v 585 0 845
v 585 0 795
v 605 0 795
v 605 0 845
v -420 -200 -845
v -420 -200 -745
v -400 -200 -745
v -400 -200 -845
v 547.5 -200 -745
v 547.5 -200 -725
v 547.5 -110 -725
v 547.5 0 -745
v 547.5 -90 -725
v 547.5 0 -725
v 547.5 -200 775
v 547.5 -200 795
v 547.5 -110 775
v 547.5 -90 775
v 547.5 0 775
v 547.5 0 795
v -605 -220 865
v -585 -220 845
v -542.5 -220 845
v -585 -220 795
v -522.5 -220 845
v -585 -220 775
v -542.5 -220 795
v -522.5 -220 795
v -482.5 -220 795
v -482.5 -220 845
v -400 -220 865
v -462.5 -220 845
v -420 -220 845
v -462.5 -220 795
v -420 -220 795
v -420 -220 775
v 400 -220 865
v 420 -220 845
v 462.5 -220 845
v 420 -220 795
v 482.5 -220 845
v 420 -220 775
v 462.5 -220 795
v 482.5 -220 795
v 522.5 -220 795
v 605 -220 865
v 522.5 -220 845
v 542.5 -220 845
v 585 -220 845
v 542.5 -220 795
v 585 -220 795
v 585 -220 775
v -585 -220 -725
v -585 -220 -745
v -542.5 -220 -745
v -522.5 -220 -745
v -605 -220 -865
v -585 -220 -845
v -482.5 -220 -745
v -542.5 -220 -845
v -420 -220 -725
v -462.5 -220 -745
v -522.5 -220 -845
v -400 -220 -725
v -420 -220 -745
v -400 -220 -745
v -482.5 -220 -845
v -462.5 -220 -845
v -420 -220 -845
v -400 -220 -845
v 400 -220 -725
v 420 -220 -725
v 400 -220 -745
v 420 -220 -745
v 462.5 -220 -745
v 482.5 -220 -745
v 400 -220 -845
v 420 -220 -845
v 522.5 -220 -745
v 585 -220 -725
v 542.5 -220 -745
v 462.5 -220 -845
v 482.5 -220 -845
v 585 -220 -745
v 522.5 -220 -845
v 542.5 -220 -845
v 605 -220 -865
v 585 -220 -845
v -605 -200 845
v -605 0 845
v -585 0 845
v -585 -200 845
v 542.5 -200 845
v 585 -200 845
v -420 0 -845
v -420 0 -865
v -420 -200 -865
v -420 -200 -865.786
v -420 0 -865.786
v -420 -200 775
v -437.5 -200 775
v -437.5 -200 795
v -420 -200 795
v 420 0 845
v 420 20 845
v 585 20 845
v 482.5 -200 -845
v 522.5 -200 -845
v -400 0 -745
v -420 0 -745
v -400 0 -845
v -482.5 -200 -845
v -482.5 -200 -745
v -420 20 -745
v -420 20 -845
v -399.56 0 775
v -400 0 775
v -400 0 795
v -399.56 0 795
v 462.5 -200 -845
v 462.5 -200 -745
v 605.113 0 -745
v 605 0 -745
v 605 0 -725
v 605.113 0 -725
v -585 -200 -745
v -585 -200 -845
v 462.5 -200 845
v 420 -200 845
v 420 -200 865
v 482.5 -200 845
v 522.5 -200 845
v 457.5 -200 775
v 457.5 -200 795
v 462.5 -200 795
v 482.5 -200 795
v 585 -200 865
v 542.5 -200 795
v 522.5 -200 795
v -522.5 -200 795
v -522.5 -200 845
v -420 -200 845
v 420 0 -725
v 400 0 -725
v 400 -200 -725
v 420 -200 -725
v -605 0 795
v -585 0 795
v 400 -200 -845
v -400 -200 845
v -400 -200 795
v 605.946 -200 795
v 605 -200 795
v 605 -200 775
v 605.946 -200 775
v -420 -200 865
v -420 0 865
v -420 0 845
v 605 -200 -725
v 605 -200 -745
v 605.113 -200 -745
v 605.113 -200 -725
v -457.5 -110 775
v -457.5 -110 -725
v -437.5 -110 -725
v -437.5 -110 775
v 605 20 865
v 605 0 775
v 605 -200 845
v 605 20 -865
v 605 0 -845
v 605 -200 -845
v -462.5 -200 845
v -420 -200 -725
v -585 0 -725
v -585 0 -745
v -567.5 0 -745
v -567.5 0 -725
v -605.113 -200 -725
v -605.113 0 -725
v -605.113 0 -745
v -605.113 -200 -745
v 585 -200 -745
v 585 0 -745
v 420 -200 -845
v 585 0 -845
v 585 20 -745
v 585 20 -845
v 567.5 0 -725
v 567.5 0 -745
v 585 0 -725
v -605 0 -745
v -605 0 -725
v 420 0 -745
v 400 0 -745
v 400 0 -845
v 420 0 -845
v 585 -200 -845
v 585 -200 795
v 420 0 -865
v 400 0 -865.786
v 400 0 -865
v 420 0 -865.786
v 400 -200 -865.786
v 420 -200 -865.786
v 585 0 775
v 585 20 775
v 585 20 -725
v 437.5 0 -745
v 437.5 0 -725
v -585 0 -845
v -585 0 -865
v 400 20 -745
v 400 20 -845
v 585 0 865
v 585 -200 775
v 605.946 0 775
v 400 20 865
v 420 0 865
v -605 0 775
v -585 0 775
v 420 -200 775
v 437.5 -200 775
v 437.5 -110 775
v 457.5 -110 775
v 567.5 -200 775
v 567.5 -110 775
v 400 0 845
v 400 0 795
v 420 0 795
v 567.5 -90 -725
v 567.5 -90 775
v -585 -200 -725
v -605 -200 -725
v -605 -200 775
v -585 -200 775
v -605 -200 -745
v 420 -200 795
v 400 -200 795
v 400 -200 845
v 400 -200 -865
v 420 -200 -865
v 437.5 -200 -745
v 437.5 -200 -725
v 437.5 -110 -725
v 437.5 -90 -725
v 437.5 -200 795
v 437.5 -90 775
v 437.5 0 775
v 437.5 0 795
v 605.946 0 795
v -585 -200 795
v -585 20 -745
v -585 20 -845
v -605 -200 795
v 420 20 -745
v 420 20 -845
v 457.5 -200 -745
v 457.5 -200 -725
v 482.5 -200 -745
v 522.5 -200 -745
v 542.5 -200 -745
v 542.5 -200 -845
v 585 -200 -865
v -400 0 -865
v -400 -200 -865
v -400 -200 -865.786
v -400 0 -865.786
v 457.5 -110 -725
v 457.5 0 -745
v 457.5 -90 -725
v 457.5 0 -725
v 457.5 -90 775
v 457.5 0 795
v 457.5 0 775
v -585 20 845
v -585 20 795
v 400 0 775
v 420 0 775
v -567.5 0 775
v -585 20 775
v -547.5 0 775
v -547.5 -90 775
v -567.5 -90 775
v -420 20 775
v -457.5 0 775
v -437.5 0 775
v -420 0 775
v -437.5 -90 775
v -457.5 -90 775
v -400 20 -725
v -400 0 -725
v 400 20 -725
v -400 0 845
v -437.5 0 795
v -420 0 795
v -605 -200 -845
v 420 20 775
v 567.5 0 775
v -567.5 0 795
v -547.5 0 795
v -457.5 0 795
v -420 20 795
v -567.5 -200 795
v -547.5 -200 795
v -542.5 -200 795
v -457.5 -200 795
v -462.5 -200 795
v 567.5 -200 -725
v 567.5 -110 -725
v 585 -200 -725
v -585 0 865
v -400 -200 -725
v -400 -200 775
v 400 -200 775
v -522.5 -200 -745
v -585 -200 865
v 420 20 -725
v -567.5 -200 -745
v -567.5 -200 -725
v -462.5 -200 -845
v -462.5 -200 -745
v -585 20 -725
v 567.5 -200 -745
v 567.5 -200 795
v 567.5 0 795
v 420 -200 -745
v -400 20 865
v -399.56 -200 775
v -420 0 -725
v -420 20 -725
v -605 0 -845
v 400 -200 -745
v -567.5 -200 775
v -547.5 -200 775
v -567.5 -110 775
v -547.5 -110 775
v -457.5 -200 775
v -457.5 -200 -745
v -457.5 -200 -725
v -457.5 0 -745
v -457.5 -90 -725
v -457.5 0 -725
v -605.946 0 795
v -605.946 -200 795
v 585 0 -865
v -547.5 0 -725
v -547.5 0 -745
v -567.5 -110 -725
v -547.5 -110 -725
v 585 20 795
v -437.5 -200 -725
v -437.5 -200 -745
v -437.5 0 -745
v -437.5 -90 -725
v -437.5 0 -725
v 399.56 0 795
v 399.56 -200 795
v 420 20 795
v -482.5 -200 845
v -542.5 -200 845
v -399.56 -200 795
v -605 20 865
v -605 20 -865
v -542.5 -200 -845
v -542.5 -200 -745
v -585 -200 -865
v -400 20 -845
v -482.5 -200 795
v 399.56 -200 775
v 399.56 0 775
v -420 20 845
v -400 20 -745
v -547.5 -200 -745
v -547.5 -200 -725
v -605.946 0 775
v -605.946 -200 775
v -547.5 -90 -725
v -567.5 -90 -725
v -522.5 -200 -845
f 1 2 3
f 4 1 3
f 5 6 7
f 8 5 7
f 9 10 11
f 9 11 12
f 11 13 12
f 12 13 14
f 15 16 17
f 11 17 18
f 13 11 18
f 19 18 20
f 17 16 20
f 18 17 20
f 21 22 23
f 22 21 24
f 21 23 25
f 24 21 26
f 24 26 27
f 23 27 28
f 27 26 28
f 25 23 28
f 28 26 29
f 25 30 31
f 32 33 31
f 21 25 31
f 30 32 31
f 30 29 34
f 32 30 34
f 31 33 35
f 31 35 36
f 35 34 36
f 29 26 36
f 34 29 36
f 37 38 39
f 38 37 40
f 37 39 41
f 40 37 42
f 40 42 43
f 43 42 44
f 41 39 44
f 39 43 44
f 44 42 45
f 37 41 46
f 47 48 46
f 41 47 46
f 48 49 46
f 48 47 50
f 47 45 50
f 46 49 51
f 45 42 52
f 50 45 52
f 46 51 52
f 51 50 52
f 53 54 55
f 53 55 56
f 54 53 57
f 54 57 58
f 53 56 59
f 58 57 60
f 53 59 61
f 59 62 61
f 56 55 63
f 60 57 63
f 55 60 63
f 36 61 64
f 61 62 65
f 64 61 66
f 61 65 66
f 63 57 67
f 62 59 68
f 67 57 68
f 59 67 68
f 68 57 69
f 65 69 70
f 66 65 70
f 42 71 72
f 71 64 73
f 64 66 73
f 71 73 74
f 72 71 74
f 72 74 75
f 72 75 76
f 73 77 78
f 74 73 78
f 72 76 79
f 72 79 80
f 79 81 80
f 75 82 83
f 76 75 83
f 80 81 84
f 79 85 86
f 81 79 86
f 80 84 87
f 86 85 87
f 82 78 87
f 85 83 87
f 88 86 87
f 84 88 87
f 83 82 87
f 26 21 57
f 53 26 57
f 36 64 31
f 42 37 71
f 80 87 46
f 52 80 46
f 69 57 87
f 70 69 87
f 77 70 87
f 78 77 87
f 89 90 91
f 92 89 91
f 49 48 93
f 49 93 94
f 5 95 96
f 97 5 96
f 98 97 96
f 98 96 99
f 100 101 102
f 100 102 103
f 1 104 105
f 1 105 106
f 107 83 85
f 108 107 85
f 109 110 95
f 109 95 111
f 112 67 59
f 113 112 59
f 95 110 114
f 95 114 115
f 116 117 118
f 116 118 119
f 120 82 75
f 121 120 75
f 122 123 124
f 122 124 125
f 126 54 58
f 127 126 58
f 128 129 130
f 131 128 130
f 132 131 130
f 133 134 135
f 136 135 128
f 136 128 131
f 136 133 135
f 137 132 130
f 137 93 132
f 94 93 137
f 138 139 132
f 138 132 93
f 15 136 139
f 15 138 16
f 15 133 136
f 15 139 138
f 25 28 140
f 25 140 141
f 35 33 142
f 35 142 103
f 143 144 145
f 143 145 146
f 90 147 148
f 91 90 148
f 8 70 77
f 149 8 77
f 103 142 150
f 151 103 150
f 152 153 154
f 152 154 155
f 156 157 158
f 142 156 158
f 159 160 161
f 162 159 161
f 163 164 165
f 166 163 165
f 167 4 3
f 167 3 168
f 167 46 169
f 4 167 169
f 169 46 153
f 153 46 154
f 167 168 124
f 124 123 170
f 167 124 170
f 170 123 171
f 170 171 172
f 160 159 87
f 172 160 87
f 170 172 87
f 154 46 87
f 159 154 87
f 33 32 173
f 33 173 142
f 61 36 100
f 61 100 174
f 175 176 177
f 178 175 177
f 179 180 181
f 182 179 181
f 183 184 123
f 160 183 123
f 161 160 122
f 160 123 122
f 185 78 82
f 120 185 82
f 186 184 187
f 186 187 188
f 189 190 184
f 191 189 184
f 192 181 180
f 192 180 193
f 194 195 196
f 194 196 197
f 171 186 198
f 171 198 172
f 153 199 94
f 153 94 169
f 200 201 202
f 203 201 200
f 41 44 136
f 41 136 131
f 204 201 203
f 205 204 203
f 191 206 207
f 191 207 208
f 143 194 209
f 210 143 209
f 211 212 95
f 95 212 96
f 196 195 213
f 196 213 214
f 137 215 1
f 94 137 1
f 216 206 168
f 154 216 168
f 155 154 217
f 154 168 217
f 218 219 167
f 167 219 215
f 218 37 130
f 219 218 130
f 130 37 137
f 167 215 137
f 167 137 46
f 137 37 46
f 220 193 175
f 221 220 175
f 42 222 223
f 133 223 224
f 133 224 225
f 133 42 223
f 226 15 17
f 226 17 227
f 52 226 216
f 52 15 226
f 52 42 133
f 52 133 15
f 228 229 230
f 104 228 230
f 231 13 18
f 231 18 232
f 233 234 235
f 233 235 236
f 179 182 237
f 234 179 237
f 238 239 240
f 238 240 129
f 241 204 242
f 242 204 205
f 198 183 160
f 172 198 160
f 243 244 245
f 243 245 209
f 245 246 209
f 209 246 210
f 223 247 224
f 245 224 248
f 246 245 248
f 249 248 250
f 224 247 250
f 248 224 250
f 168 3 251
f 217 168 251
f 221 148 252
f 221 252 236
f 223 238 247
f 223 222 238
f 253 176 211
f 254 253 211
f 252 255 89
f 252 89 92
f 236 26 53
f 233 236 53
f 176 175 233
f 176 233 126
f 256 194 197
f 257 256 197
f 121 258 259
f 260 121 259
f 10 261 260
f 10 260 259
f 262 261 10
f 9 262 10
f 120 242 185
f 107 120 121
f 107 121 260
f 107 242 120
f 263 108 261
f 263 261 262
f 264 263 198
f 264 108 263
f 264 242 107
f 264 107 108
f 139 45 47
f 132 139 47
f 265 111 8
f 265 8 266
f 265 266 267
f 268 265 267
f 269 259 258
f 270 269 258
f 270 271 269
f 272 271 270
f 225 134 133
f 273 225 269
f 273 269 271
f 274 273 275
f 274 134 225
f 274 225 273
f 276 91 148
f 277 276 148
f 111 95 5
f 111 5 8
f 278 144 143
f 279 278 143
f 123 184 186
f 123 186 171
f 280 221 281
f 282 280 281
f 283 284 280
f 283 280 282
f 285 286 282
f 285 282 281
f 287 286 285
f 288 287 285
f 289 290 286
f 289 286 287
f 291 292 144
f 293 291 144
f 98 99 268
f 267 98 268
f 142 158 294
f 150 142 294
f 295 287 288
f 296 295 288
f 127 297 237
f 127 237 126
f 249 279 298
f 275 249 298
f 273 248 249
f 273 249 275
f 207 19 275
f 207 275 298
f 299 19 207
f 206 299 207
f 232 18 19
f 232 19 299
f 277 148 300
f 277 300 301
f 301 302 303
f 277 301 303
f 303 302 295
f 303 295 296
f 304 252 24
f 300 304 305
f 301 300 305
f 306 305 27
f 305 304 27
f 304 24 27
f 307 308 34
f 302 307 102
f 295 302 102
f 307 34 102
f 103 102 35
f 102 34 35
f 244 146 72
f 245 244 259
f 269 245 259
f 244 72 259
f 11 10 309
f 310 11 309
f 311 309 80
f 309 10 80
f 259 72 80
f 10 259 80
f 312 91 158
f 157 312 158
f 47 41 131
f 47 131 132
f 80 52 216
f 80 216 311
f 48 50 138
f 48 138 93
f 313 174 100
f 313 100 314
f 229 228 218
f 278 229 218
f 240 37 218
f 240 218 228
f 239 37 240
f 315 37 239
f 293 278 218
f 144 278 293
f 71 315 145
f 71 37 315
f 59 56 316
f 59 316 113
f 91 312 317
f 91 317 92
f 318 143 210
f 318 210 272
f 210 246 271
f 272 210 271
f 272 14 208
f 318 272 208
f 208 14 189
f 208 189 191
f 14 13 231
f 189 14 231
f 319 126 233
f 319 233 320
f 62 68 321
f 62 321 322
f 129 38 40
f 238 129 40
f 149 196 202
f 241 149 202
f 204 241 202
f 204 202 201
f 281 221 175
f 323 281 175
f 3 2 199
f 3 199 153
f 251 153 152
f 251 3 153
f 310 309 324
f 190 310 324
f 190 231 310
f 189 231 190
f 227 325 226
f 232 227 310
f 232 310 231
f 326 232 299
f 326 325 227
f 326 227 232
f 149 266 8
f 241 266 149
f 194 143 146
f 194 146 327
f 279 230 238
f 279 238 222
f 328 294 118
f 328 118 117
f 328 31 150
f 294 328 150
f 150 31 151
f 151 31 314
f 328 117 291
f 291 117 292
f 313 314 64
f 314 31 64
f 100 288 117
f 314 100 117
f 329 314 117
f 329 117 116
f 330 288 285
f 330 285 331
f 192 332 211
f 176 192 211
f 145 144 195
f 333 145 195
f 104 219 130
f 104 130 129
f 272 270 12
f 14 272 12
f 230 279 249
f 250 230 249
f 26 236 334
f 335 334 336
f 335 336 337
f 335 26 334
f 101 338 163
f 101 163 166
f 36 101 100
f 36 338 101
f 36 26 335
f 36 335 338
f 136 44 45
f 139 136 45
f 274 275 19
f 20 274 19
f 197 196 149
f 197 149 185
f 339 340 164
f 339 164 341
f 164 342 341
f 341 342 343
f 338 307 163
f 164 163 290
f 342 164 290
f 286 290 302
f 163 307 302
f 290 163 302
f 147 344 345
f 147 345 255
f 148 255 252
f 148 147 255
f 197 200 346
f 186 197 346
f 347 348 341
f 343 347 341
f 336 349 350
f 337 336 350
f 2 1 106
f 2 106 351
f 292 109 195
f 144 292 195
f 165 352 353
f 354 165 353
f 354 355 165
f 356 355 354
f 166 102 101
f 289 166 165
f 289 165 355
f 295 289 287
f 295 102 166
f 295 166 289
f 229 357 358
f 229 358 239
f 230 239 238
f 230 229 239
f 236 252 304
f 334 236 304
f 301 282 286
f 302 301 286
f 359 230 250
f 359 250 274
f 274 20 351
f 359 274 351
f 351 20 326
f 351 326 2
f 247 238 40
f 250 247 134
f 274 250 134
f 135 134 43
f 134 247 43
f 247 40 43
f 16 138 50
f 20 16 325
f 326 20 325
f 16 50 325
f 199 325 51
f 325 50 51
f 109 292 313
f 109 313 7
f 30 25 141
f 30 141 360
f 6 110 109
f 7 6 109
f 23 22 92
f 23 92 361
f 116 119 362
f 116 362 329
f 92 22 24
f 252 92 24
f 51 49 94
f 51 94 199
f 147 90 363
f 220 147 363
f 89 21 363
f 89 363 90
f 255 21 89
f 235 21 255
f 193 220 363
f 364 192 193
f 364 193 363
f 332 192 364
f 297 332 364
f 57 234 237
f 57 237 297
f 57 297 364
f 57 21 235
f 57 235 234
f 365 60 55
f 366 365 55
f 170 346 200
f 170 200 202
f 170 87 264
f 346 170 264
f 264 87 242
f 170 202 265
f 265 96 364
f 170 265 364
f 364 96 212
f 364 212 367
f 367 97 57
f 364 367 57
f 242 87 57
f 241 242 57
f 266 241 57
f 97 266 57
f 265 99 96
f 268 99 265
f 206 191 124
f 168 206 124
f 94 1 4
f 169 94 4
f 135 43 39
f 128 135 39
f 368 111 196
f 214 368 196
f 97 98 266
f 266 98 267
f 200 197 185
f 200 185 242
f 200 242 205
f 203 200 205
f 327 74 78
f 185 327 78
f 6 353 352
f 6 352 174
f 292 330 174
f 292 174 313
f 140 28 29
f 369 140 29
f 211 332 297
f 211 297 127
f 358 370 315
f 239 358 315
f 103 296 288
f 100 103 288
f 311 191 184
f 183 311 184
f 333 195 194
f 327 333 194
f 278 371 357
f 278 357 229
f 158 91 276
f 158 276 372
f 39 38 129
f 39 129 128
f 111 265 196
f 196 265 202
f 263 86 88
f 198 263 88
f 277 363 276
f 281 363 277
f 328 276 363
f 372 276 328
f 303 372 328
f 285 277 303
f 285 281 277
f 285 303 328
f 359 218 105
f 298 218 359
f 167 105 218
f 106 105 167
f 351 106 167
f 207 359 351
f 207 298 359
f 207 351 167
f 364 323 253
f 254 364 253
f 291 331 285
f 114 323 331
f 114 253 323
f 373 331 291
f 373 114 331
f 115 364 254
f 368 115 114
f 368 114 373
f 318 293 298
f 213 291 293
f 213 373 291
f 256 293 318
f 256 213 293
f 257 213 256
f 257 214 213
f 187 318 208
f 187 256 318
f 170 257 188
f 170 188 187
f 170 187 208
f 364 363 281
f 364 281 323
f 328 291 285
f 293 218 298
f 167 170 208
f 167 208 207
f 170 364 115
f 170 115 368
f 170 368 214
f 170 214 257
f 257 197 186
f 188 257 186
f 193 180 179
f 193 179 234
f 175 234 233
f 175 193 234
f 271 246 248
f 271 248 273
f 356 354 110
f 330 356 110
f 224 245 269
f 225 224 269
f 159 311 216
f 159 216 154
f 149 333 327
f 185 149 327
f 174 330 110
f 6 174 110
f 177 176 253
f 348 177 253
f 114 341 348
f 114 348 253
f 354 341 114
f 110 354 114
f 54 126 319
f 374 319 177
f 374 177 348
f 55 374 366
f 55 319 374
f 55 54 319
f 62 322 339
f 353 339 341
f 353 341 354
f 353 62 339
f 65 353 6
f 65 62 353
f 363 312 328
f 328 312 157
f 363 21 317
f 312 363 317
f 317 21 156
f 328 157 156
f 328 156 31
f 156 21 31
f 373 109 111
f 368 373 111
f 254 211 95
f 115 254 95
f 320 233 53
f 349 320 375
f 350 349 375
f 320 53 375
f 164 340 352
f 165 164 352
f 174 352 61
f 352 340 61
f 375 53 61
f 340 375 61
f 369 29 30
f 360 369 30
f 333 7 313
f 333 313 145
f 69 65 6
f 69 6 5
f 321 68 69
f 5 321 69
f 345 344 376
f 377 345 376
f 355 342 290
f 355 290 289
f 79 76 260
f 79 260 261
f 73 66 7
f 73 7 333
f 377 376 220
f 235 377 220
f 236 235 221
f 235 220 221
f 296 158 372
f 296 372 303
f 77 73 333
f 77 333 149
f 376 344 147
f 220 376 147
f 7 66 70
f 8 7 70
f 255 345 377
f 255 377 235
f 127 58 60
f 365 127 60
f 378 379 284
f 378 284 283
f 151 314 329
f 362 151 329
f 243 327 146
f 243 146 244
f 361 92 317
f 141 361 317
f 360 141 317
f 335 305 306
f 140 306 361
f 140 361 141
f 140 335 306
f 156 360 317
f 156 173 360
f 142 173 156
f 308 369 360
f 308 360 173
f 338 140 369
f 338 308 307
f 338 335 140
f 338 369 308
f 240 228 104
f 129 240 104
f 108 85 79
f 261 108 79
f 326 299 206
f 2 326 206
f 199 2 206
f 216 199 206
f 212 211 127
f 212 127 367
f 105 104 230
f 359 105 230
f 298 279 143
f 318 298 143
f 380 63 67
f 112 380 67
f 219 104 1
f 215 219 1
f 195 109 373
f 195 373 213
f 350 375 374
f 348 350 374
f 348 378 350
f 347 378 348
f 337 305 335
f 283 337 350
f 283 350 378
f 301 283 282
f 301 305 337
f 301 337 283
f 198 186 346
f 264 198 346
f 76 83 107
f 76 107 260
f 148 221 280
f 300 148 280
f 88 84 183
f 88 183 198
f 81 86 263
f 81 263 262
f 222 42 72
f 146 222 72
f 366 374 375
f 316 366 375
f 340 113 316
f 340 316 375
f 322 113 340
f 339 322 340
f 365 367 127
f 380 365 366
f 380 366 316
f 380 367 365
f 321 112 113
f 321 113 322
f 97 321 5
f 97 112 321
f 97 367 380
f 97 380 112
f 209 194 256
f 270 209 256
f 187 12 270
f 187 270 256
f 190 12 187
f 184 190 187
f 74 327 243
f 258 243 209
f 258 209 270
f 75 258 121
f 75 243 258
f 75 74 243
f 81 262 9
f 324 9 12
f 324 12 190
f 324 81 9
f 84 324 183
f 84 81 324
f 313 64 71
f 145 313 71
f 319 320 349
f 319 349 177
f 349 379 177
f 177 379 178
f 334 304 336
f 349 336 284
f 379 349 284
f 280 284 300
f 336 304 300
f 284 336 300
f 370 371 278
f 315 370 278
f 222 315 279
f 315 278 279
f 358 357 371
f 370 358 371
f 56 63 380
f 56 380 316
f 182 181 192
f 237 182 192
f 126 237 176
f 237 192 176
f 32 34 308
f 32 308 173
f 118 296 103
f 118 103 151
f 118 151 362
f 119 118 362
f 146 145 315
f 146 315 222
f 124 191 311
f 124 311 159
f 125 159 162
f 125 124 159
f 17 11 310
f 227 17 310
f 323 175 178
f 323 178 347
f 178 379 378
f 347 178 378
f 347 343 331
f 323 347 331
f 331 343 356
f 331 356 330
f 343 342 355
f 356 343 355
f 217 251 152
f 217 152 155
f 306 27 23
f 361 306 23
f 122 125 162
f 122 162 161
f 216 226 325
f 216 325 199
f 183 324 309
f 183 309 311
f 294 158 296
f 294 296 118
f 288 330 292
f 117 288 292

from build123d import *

# Parameters (mm, degrees)
SKETCH1_W           = 20
SKETCH1_H           = 1730
SKETCH1_W_2         = 165
SKETCH1_H_2         = 20
SKETCH1_W_3         = 800
BOSS_EXTRUDE1_DEPTH = 20
LPATTERN1_COUNT     = 2
LPATTERN1_PITCH     = 220
SKETCH2_W           = 20.11323458
SKETCH2_H           = 20
SKETCH2_W_2         = 20
SKETCH2_H_2         = 20.786356151
SKETCH2_W_3         = 20.945730737
SKETCH2_W_4         = 20.439611237
BOSS_EXTRUDE2_DEPTH = 200
SKETCH3_W           = 20
SKETCH3_H           = 100
SKETCH3_H_2         = 50
BOSS_EXTRUDE3_DEPTH = 20
SKETCH4_W           = 20
SKETCH4_H           = 200
BOSS_EXTRUDE4_DEPTH = 20
LPATTERN2_COUNT     = 2
LPATTERN2_PITCH     = 1520
SKETCH5_W           = 20
SKETCH5_H           = 20
BOSS_EXTRUDE5_DEPTH = 1500


with BuildPart() as part:
    # Sketch1 → Boss-Extrude1 (new body)
    with BuildSketch(Plane(origin=(0, 0, 0), x_dir=(1, 0, 0), z_dir=(0, 1, 0))):
        with Locations((-595, 0)):
            Rectangle(SKETCH1_W, SKETCH1_H)
        with Locations((-410, 0)):
            Rectangle(SKETCH1_W, SKETCH1_H)
        with Locations((-502.5, 735)):
            Rectangle(SKETCH1_W_2, SKETCH1_H_2)
        with Locations((-502.5, 855)):
            Rectangle(SKETCH1_W_2, SKETCH1_H_2)
        with Locations((0, 735)):
            Rectangle(SKETCH1_W_3, SKETCH1_H_2)
        with Locations((0, 855)):
            Rectangle(SKETCH1_W_3, SKETCH1_H_2)
        with Locations((502.5, 855)):
            Rectangle(SKETCH1_W_2, SKETCH1_H_2)
        with Locations((410, 0)):
            Rectangle(SKETCH1_W, SKETCH1_H)
        with Locations((502.5, 735)):
            Rectangle(SKETCH1_W_2, SKETCH1_H_2)
        with Locations((595, 0)):
            Rectangle(SKETCH1_W, SKETCH1_H)
        with Locations((502.5, -785)):
            Rectangle(SKETCH1_W_2, SKETCH1_H_2)
        with Locations((502.5, -855)):
            Rectangle(SKETCH1_W_2, SKETCH1_H_2)
        with Locations((-502.5, -785)):
            Rectangle(SKETCH1_W_2, SKETCH1_H_2)
        with Locations((-502.5, -855)):
            Rectangle(SKETCH1_W_2, SKETCH1_H_2)
    extrude(amount=BOSS_EXTRUDE1_DEPTH)


with BuildPart() as lpattern1_1:
    # LPattern1: pattern copy
    add(part.part.moved(Location(Vector(0, -1, 0) * (1 * LPATTERN1_PITCH))))


with BuildPart() as part_1:
    add(part.part)

    add(lpattern1_1.part)  # Boss-Extrude2 merges LPattern1_1
    # Sketch2 → Boss-Extrude2 (add)
    with BuildSketch(Plane(origin=(0, 0, 0), x_dir=(1, 0, 0), z_dir=(0, 1, 0))):
        with Locations((-595.05661729, 735)):
            Rectangle(SKETCH2_W, SKETCH2_H)
        with Locations((-595, 855)):
            Rectangle(SKETCH2_W_2, SKETCH2_H)
        with Locations((-410, 855.393178076)):
            Rectangle(SKETCH2_W_2, SKETCH2_H_2)
        with Locations((-595.472865369, -785)):
            Rectangle(SKETCH2_W_3, SKETCH2_H)
        with Locations((-410, 735)):
            Rectangle(SKETCH2_W_2, SKETCH2_H)
        with Locations((-595, -855)):
            Rectangle(SKETCH2_W_2, SKETCH2_H)
        with Locations((-410, -855)):
            Rectangle(SKETCH2_W_2, SKETCH2_H)
        with Locations((-409.780194381, -785)):
            Rectangle(SKETCH2_W_4, SKETCH2_H)
        with Locations((595.472865369, -785)):
            Rectangle(SKETCH2_W_3, SKETCH2_H)
        with Locations((410, -855)):
            Rectangle(SKETCH2_W_2, SKETCH2_H)
        with Locations((595, -855)):
            Rectangle(SKETCH2_W_2, SKETCH2_H)
        with Locations((410, 735)):
            Rectangle(SKETCH2_W_2, SKETCH2_H)
        with Locations((410, 855.393178076)):
            Rectangle(SKETCH2_W_2, SKETCH2_H_2)
        with Locations((595.05661729, 735)):
            Rectangle(SKETCH2_W, SKETCH2_H)
        with Locations((595, 855)):
            Rectangle(SKETCH2_W_2, SKETCH2_H)
        with Locations((409.780194381, -785)):
            Rectangle(SKETCH2_W_4, SKETCH2_H)
    extrude(amount=-BOSS_EXTRUDE2_DEPTH)

    # Sketch3 → Boss-Extrude3 (add)
    with BuildSketch(Plane.XZ.offset(220)):
        with Locations((-472.5, -795)):
            Rectangle(SKETCH3_W, SKETCH3_H)
        with Locations((-532.5, -795)):
            Rectangle(SKETCH3_W, SKETCH3_H)
        with Locations((-472.5, 820)):
            Rectangle(SKETCH3_W, SKETCH3_H_2)
        with Locations((-532.5, 820)):
            Rectangle(SKETCH3_W, SKETCH3_H_2)
        with Locations((532.5, 820)):
            Rectangle(SKETCH3_W, SKETCH3_H_2)
        with Locations((472.5, 820)):
            Rectangle(SKETCH3_W, SKETCH3_H_2)
        with Locations((532.5, -795)):
            Rectangle(SKETCH3_W, SKETCH3_H)
        with Locations((472.5, -795)):
            Rectangle(SKETCH3_W, SKETCH3_H)
    extrude(amount=-BOSS_EXTRUDE3_DEPTH)

    # Sketch4 → Boss-Extrude4 (add)
    with BuildSketch(Plane.XY.offset(-725)):
        with Locations((-447.5, -100)):
            Rectangle(SKETCH4_W, SKETCH4_H)
        with Locations((-557.5, -100)):
            Rectangle(SKETCH4_W, SKETCH4_H)
        with Locations((557.5, -100)):
            Rectangle(SKETCH4_W, SKETCH4_H)
        with Locations((447.5, -100)):
            Rectangle(SKETCH4_W, SKETCH4_H)
    boss_extrude4 = extrude(amount=-BOSS_EXTRUDE4_DEPTH)

    # LPattern2: Boss-Extrude4 ×2
    with Locations(*[(0, 0, i * LPATTERN2_PITCH) for i in range(1, LPATTERN2_COUNT)]):
        add(boss_extrude4)

    # Sketch5 → Boss-Extrude5 (add)
    with BuildSketch(Plane.XY.offset(-725)):
        with Locations((-557.5, -100)):
            Rectangle(SKETCH5_W, SKETCH5_H)
        with Locations((-447.5, -100)):
            Rectangle(SKETCH5_W, SKETCH5_H)
        with Locations((447.5, -100)):
            Rectangle(SKETCH5_W, SKETCH5_H)
        with Locations((557.5, -100)):
            Rectangle(SKETCH5_W, SKETCH5_H)
    extrude(amount=BOSS_EXTRUDE5_DEPTH)


solid = part_1.part
